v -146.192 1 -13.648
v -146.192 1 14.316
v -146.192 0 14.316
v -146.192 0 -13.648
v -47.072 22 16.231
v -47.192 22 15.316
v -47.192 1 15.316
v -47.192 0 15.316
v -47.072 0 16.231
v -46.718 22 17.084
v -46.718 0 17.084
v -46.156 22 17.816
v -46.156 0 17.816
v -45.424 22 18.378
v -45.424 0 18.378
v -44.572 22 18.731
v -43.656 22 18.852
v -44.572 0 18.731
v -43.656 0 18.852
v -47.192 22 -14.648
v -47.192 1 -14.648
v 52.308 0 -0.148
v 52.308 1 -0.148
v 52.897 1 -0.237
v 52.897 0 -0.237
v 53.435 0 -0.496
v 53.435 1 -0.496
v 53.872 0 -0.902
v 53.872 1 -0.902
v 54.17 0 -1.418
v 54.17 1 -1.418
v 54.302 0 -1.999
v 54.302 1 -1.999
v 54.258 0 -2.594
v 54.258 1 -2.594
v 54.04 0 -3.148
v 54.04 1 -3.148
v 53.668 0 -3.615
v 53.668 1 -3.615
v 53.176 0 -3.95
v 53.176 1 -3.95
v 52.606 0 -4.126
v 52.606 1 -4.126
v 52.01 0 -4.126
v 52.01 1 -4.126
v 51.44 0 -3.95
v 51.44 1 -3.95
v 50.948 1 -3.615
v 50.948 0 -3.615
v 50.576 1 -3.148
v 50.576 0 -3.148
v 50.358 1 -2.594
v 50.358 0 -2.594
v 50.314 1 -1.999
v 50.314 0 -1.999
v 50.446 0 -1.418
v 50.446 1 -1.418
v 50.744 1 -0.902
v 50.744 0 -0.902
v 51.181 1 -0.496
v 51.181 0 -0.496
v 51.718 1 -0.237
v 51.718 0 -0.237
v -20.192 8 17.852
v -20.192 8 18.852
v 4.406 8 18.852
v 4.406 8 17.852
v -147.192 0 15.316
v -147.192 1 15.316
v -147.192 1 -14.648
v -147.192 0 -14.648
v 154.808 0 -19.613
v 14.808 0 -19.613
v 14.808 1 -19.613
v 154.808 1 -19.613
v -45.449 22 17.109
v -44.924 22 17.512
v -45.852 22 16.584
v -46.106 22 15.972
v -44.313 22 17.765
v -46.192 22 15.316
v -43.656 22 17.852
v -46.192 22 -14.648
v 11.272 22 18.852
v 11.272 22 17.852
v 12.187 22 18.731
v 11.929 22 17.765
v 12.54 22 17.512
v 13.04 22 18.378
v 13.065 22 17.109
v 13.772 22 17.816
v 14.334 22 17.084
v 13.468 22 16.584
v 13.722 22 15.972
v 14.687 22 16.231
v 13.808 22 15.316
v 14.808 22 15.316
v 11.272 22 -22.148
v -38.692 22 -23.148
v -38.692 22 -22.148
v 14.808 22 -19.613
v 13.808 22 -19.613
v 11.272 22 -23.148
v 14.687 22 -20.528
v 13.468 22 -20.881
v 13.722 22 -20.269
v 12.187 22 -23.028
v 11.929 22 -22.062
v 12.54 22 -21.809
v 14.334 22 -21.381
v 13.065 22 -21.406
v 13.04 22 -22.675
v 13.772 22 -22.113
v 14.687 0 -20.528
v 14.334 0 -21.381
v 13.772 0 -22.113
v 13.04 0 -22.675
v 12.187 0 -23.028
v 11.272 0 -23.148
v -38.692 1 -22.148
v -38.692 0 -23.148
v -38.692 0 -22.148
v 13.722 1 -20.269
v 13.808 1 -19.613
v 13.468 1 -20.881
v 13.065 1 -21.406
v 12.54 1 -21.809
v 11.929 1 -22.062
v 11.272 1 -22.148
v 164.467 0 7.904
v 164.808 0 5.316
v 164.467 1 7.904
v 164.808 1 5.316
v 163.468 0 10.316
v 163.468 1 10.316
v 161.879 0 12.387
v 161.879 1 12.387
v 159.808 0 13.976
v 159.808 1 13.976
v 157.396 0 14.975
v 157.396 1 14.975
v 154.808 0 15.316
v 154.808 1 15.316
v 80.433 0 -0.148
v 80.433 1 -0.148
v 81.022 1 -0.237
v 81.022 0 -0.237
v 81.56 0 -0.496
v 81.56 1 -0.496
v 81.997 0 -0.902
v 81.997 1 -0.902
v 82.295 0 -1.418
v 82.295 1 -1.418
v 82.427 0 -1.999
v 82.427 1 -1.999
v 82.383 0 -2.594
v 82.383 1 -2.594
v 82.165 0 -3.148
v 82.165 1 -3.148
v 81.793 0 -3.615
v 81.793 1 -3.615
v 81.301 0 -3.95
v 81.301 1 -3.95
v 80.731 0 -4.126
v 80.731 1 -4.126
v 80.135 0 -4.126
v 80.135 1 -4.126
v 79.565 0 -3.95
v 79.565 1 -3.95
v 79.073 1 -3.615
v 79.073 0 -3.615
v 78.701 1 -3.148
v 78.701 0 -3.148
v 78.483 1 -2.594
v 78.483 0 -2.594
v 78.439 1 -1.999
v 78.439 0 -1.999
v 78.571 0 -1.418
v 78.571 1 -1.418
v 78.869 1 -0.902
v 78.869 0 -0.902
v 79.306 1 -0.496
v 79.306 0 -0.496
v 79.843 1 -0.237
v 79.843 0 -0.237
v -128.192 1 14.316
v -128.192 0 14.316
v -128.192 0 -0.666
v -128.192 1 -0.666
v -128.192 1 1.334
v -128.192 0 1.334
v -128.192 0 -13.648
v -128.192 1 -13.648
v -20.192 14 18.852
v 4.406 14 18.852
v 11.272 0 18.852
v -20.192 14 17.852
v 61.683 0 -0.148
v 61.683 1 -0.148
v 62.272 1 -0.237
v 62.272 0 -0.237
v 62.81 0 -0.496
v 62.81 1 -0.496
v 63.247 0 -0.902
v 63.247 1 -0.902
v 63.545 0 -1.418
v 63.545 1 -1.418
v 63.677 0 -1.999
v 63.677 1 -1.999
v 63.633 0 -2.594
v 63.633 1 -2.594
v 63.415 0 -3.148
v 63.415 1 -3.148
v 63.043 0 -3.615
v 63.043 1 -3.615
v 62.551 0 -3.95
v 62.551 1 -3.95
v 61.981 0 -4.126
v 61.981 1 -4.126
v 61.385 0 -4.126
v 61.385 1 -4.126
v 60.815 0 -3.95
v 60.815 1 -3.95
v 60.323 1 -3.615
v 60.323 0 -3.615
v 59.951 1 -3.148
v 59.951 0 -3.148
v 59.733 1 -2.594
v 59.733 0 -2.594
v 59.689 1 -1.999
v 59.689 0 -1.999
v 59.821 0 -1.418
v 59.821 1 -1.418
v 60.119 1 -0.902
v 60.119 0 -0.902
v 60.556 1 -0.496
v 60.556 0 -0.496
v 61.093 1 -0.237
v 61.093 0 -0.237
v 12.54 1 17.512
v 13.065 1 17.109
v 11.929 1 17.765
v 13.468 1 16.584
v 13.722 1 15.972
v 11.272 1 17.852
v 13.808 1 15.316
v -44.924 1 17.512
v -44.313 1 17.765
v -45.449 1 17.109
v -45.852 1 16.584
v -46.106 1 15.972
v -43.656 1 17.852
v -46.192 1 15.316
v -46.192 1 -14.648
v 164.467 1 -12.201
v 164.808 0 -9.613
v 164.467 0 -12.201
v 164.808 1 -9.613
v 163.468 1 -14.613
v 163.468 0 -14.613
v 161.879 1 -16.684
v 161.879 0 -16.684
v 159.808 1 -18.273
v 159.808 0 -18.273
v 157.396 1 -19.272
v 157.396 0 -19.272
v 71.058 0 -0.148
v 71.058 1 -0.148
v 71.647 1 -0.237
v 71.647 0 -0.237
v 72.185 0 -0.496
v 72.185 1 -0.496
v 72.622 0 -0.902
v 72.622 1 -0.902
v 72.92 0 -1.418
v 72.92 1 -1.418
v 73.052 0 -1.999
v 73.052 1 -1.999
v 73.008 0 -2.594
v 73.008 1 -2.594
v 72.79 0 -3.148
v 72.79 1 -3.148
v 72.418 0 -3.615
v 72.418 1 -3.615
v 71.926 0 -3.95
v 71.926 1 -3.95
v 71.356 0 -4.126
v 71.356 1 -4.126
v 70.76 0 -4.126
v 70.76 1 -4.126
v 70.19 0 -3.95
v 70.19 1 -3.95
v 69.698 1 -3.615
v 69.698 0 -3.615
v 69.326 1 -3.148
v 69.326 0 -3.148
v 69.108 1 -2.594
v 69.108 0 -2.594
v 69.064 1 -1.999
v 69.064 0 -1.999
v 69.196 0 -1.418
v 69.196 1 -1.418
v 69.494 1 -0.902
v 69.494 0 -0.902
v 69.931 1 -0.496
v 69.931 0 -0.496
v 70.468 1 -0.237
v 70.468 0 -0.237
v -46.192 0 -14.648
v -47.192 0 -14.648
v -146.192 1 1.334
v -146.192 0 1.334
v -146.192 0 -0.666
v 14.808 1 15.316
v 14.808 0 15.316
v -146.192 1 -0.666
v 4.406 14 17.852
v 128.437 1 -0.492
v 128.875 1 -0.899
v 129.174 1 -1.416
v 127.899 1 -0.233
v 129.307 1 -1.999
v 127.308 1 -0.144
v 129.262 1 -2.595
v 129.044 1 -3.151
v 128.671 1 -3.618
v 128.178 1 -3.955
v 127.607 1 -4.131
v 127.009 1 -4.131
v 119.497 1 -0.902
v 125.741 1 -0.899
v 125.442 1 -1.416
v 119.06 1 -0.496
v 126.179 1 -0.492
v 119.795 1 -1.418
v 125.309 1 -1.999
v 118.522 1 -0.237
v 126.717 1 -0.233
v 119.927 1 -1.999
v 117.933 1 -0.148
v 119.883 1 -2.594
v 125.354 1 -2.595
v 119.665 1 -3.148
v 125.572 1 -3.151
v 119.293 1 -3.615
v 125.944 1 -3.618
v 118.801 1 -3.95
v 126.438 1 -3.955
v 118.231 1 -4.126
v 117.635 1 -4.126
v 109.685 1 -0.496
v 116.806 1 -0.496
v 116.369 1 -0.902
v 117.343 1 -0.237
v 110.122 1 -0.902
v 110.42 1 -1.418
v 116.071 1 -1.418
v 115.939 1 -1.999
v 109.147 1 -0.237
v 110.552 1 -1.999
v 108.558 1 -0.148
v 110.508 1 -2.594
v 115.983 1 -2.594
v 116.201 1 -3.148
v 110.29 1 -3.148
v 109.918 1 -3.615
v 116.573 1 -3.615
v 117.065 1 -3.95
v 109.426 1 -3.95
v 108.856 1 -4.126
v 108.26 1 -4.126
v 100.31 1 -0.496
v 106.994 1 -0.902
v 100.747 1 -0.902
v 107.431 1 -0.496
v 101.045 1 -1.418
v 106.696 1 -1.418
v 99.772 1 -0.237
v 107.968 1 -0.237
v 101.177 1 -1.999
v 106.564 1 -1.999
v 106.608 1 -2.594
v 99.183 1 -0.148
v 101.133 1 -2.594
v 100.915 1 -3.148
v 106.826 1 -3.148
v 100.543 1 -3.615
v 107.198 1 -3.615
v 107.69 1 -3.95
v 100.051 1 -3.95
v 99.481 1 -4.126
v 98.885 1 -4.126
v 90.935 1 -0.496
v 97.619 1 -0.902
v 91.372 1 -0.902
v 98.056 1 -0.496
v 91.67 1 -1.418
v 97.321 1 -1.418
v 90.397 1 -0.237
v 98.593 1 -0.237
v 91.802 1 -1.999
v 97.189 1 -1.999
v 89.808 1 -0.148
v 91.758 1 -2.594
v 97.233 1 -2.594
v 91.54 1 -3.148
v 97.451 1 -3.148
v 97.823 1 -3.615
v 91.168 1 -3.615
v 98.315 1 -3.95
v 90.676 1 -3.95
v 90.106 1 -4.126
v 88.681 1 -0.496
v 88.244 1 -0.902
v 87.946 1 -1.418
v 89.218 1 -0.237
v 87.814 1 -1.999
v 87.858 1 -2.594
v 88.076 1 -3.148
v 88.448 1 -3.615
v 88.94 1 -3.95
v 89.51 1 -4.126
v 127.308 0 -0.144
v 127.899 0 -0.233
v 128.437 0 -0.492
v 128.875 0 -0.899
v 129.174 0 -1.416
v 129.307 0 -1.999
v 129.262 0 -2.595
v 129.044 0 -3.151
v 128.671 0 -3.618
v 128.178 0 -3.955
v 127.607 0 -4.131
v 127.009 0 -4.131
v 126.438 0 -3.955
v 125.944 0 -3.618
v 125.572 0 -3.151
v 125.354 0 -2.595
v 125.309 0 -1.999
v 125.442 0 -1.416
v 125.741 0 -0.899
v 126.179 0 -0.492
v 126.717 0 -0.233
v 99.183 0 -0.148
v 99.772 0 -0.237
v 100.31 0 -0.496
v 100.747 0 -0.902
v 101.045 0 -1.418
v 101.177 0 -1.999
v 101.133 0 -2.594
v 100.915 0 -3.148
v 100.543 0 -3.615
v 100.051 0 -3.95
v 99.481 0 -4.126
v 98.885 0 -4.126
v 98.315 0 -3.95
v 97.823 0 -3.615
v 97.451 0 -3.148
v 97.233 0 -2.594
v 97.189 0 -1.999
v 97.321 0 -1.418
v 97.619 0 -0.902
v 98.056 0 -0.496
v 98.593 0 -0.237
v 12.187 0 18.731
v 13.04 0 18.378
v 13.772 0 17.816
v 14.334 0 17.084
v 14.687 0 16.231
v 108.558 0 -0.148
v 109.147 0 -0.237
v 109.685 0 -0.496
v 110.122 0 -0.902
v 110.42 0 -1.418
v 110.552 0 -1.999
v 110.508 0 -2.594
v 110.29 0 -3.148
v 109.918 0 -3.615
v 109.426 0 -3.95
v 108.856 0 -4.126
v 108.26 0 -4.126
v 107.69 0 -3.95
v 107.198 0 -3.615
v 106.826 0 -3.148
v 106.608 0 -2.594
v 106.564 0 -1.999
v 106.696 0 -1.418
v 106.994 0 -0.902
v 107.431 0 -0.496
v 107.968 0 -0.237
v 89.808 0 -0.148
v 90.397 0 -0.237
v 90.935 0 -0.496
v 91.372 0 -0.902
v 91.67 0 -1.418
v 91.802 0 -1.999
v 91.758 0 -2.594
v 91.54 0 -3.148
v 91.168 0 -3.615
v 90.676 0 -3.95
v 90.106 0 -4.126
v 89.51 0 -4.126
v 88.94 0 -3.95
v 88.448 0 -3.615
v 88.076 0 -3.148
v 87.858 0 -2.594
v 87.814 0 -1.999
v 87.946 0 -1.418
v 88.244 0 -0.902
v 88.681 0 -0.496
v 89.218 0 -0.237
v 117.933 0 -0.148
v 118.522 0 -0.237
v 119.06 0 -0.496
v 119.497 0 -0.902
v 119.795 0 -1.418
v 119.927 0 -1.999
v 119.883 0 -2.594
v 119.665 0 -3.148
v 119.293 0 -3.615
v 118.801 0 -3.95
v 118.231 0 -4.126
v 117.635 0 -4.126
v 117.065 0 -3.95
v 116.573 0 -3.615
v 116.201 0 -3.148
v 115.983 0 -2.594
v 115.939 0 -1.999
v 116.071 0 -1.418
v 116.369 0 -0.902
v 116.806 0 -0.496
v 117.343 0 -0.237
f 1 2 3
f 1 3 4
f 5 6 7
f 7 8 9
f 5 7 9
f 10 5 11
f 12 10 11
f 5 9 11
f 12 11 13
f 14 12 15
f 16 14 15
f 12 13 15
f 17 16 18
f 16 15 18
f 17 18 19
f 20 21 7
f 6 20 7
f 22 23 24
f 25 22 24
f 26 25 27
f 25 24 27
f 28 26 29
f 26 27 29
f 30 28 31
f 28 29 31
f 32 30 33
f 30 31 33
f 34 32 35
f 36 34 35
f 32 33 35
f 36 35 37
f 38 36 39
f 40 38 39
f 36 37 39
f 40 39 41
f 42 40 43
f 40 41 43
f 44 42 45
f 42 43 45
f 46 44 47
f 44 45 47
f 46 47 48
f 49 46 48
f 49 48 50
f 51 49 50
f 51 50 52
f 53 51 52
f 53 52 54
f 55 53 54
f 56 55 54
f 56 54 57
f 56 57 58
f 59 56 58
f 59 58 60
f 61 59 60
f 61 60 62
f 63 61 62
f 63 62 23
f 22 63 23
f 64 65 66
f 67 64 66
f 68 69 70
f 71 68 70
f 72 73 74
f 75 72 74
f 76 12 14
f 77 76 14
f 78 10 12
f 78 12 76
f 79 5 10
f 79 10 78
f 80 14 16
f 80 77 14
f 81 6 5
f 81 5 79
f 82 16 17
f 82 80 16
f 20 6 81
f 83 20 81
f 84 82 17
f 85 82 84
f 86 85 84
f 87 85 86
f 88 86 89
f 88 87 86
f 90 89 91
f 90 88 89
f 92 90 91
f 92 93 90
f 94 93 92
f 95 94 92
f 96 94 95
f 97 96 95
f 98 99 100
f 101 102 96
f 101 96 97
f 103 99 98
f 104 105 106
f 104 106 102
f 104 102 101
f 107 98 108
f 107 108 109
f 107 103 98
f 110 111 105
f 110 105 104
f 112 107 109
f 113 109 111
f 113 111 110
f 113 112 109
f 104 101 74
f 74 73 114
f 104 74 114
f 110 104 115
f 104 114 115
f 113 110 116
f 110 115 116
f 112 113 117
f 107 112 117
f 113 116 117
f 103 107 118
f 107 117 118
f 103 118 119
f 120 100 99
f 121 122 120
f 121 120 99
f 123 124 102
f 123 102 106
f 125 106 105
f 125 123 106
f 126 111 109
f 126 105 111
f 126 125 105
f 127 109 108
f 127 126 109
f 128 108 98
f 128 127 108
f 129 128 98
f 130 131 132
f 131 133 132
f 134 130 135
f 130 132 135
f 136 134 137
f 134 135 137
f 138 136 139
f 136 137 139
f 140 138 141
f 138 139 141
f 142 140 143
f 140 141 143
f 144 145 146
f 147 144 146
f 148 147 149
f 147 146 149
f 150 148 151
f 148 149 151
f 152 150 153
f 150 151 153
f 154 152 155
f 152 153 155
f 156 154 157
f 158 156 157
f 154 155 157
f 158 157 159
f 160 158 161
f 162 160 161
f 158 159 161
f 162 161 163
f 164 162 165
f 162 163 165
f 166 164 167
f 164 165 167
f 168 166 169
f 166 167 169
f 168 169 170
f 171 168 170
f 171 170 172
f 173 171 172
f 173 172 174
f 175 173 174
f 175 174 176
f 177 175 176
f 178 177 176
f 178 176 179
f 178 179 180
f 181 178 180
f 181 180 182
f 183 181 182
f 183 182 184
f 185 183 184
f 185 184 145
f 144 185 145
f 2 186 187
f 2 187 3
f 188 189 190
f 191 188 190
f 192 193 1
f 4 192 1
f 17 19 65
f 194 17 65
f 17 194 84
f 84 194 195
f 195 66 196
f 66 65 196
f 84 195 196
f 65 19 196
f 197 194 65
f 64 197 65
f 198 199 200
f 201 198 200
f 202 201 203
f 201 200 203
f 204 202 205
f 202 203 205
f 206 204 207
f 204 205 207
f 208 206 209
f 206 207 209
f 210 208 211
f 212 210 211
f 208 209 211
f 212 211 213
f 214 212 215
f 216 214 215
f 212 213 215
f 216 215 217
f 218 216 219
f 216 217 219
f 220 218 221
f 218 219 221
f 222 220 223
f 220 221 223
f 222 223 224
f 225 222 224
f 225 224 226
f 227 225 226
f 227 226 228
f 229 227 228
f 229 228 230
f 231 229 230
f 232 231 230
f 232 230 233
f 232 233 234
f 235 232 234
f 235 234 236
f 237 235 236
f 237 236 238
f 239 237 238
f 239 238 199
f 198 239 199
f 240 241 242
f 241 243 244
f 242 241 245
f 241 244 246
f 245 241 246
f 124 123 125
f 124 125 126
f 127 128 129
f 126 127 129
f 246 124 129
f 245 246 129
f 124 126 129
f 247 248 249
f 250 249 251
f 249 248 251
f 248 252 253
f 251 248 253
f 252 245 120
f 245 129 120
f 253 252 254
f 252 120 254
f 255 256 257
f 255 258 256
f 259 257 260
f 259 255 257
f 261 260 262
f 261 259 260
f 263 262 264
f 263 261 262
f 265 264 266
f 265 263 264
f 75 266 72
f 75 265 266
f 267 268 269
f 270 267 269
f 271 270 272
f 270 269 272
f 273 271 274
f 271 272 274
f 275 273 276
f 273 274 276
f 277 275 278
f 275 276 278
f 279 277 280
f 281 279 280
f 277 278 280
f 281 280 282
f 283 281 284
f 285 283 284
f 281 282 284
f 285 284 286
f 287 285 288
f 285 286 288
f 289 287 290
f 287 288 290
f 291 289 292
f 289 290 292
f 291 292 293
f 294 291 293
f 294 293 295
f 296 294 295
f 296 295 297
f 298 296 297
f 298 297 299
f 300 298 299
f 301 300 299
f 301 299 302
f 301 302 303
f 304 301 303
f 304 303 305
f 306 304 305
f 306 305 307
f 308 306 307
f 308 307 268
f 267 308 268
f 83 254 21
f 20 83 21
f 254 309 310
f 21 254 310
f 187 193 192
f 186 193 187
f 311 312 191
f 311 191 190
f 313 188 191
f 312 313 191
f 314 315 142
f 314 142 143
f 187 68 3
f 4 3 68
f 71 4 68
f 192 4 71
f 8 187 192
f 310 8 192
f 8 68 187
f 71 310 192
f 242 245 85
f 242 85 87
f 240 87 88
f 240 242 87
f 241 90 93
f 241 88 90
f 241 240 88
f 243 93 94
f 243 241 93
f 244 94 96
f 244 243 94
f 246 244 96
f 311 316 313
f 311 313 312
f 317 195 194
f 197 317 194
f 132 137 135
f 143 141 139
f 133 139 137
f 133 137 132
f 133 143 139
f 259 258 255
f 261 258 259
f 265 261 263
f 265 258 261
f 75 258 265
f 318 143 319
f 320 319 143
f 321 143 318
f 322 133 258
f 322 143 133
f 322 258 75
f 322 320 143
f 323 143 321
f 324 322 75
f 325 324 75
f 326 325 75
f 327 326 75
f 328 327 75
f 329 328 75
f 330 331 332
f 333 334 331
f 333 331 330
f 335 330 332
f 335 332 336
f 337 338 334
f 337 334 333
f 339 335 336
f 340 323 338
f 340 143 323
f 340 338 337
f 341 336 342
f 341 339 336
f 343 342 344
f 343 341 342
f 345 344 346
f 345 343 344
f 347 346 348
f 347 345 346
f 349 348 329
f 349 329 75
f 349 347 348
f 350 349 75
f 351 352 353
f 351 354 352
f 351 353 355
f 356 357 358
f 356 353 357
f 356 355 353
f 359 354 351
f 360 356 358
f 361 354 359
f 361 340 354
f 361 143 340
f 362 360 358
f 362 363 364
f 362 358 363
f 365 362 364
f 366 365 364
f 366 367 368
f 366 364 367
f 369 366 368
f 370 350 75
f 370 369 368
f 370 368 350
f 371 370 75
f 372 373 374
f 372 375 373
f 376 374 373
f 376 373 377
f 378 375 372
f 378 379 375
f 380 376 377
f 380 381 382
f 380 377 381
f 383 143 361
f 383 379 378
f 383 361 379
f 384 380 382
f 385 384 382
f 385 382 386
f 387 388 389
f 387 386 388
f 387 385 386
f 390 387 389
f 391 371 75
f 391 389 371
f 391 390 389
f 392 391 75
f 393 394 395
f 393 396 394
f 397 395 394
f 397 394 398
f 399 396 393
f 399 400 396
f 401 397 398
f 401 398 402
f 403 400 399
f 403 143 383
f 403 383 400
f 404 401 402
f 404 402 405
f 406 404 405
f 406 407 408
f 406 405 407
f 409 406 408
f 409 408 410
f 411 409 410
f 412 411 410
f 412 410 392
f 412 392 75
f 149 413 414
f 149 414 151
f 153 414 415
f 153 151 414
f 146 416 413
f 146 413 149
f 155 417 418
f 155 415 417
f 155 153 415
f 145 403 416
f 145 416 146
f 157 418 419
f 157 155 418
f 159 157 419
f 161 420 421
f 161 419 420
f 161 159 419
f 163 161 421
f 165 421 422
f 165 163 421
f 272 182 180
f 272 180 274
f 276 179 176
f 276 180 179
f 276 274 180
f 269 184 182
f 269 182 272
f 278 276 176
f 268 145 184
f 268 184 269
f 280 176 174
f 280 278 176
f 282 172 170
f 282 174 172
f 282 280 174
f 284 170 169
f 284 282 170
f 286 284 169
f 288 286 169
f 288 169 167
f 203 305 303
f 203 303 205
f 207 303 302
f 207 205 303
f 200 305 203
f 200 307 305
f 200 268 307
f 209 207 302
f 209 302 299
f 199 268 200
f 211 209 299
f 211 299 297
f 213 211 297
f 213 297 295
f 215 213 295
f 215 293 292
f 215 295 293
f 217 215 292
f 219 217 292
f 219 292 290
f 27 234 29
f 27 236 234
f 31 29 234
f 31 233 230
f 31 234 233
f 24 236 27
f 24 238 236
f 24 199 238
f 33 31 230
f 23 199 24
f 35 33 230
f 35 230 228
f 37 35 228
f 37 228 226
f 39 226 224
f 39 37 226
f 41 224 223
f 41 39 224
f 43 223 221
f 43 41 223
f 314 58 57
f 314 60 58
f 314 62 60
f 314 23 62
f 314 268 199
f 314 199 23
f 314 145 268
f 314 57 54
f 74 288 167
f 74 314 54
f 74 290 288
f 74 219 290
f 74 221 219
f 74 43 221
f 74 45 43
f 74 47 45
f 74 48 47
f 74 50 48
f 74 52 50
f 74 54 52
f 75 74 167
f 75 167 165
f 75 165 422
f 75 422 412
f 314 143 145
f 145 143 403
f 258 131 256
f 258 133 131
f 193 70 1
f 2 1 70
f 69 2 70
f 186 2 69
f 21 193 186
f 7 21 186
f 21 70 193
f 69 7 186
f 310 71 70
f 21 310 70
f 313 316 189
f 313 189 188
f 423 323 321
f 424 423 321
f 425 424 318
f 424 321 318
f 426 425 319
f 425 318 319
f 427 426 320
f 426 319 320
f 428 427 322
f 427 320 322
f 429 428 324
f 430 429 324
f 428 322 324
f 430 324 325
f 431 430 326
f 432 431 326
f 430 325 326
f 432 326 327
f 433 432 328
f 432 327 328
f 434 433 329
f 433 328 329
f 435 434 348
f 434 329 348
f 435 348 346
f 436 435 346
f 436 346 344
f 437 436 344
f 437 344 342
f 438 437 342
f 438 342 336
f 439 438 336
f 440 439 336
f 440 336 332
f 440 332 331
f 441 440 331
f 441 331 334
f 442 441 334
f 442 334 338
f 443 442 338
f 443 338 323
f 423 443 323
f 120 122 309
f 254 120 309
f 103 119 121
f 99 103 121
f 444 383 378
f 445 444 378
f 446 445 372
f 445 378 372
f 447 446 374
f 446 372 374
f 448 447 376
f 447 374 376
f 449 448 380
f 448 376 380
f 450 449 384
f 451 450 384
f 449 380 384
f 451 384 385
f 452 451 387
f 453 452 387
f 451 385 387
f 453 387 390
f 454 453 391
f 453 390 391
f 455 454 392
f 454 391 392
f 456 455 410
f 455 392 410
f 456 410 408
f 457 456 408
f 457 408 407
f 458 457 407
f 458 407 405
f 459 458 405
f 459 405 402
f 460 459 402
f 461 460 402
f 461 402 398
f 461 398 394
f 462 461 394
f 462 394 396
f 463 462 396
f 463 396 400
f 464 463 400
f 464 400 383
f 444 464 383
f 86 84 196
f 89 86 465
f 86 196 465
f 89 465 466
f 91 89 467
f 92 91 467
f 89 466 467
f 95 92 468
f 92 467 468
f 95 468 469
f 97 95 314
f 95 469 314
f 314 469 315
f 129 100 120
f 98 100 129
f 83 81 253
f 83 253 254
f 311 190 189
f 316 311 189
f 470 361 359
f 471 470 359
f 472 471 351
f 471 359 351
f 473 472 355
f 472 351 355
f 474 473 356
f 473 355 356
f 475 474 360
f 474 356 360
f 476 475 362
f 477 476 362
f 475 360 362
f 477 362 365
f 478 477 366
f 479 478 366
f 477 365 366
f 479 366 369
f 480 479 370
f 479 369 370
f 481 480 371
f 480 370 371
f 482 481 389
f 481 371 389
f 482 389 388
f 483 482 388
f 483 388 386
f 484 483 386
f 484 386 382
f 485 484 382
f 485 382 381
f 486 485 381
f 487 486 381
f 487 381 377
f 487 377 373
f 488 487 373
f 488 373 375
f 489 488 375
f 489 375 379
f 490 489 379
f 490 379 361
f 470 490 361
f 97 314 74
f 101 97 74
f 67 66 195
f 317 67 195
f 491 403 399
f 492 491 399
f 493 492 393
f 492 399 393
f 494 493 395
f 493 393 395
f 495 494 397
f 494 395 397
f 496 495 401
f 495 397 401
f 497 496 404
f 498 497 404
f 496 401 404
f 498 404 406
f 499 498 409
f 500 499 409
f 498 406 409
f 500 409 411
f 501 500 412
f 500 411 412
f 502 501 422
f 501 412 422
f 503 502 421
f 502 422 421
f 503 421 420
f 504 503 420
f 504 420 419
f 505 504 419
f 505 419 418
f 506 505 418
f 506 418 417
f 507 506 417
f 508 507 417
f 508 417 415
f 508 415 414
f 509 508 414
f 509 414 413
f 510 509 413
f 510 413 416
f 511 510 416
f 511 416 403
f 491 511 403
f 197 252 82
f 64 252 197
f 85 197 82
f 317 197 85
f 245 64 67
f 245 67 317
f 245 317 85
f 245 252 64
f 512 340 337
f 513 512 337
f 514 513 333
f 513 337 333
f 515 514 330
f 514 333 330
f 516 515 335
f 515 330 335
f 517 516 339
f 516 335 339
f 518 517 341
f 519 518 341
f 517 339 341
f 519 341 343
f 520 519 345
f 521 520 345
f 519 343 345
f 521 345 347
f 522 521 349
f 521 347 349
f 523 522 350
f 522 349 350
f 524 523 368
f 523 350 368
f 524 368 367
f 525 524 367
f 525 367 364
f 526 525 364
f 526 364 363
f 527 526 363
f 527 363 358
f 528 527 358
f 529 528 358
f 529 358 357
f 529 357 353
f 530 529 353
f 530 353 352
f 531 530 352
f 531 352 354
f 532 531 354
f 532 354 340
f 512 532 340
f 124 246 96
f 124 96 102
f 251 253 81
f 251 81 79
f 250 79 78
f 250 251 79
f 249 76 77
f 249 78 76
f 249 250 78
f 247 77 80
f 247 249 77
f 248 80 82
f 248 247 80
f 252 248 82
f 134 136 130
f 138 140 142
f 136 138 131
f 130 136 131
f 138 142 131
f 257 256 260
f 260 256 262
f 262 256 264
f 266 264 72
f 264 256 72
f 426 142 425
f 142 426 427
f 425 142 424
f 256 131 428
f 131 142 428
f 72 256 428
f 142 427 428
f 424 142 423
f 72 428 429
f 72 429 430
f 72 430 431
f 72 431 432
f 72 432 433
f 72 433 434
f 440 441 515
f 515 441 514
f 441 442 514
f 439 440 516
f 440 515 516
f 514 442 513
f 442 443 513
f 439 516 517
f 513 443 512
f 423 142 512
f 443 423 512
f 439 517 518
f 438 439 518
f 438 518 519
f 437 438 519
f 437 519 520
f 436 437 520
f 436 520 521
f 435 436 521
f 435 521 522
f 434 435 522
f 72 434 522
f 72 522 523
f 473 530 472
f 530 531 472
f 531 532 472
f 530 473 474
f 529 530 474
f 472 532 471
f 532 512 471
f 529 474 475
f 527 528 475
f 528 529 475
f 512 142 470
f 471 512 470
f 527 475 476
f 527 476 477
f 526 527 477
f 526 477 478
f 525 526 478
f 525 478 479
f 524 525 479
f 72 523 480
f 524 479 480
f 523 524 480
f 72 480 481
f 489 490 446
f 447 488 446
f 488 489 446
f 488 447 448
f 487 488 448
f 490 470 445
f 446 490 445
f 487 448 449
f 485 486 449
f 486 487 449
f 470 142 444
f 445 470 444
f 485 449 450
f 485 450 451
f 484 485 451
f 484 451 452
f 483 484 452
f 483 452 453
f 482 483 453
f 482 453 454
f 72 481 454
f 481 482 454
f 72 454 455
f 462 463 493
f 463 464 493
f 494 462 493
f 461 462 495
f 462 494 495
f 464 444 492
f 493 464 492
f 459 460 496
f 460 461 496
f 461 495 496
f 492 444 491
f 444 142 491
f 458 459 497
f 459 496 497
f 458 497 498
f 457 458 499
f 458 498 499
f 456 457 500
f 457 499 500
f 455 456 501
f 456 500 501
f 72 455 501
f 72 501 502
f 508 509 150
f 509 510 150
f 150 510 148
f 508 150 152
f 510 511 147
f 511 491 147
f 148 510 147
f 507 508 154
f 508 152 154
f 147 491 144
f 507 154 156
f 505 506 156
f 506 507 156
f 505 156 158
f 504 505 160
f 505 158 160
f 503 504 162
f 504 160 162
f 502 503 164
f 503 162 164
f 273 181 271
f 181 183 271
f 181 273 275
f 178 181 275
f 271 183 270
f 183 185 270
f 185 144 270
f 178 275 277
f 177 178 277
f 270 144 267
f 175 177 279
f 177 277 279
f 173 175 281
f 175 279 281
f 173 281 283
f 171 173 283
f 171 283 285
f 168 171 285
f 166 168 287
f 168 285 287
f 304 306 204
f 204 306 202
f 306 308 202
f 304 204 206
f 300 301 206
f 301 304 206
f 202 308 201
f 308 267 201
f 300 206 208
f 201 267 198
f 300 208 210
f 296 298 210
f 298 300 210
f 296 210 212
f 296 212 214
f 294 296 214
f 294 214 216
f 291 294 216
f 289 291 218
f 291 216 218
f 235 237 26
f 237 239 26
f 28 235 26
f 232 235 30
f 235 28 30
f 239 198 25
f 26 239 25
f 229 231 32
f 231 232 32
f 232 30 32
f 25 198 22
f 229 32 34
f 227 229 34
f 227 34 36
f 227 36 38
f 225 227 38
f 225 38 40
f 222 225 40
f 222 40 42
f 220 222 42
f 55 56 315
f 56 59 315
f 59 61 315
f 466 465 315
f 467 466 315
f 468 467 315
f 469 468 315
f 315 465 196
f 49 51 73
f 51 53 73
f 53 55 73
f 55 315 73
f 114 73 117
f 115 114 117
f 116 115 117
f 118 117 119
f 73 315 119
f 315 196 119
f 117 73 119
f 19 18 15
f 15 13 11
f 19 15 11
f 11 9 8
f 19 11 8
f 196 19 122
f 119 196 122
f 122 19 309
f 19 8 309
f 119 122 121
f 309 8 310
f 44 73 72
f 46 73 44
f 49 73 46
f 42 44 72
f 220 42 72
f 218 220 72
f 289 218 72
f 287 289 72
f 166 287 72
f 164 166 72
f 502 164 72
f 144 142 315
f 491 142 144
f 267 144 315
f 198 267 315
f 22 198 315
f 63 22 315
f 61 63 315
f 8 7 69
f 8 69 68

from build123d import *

# Parameters (mm, degrees)
SKETCH1_W           = 22.5
SKETCH1_H           = 1
BOSS_EXTRUDE1_DEPTH = 22
SHELL1_T            = -1
CUT_EXTRUDE1_DEPTH  = 21
BOSS_EXTRUDE2_DEPTH = 100
SKETCH3_W           = 34.928932188
SKETCH3_H           = 1
BOSS_EXTRUDE3_DEPTH = 150
CUT_EXTRUDE2_DEPTH  = 10
SKETCH5_R           = 2.004611179
SKETCH5_R_2         = 2
CUT_EXTRUDE3_DEPTH  = 10
FILLET1_R           = 10
FILLET2_R           = 10
CUT_EXTRUDE4_DEPTH  = 10
BOSS_EXTRUDE5_DEPTH = 18


with BuildPart() as part:
    # Sketch1 → Boss-Extrude1 (new body)
    with BuildSketch(Plane(origin=(0, 0, 0), x_dir=(1, 0, 0), z_dir=(0, 1, 0))):
        with Locations((-27.442029657, 22.648486015)):
            Rectangle(SKETCH1_W, SKETCH1_H)
        with BuildLine():
            Line((-16.192029657, 23.148486015), (-16.192029657, 22.148486015))
            Line((-16.192029657, 22.148486015), (10.272436437, 22.148486015))
            ThreePointArc((10.272436437, 22.148486015), (12.772436437, 21.112952109), (13.807970343, 18.612952109))
            Line((13.807970343, 18.612952109), (13.807970343, -14.315980079))
            ThreePointArc((13.807970343, -14.315980079), (12.772436437, -16.815980079), (10.272436437, -17.851513985))
            Line((10.272436437, -17.851513985), (-16.192029657, -17.851513985))
            Line((-16.192029657, -17.851513985), (-16.192029657, -18.851513985))
            Line((-16.192029657, -18.851513985), (11.272436437, -18.851513985))
            ThreePointArc((11.272436437, -18.851513985), (13.772436437, -17.815980079), (14.807970343, -15.315980079))
            Line((14.807970343, -15.315980079), (14.807970343, -14.315980079))
            Line((14.807970343, -14.315980079), (14.807970343, 19.612952109))
            ThreePointArc((14.807970343, 19.612952109), (13.772436437, 22.112952109), (11.272436437, 23.148486015))
            Line((11.272436437, 23.148486015), (-16.192029657, 23.148486015))
        make_face()
        with BuildLine():
            Line((-46.192029657, -14.315980079), (-46.192029657, 14.648486015))
            Line((-46.192029657, 14.648486015), (-47.192029657, 14.648486015))
            Line((-47.192029657, 14.648486015), (-47.192029657, -15.315980079))
            ThreePointArc((-47.192029657, -15.315980079), (-46.156495751, -17.815980079), (-43.656495751, -18.851513985))
            Line((-43.656495751, -18.851513985), (-16.192029657, -18.851513985))
            Line((-16.192029657, -18.851513985), (-16.192029657, -17.851513985))
            Line((-16.192029657, -17.851513985), (-42.656495751, -17.851513985))
            ThreePointArc((-42.656495751, -17.851513985), (-45.156495751, -16.815980079), (-46.192029657, -14.315980079))
        make_face()
        with BuildLine():
            Line((-42.656495751, -17.851513985), (10.272436437, -17.851513985))
            ThreePointArc((10.272436437, -17.851513985), (12.772436437, -16.815980079), (13.807970343, -14.315980079))
            Line((13.807970343, -14.315980079), (13.807970343, 18.612952109))
            ThreePointArc((13.807970343, 18.612952109), (12.772436437, 21.112952109), (10.272436437, 22.148486015))
            Line((10.272436437, 22.148486015), (-38.692029657, 22.148486015))
            Line((-38.692029657, 22.148486015), (-46.192029657, 14.648486015))
            Line((-46.192029657, 14.648486015), (-46.192029657, -14.315980079))
            ThreePointArc((-46.192029657, -14.315980079), (-45.156495751, -16.815980079), (-42.656495751, -17.851513985))
        make_face()
    extrude(amount=BOSS_EXTRUDE1_DEPTH)

    # Shell1
    shell1_openings = [part.faces().sort_by_distance(p)[0] for p in [
        (-15.741951125, 22, -1.860810616),
    ]]
    offset(amount=SHELL1_T, openings=shell1_openings, kind=Kind.INTERSECTION)

    # Sketch2 → Cut-Extrude1 (cut)
    with BuildSketch(Plane(origin=(0, 22, 0), x_dir=(1, 0, 0), z_dir=(0, 1, 0))):
        Polygon((-38.692029657, 22.148486015), (-37.692029657, 22.148486015), (-37.692029657, 21.734272453), (-45.777816094, 13.648486015), (-46.192029657, 13.648486015), (-46.192029657, 14.648486015), align=None)
    extrude(amount=-CUT_EXTRUDE1_DEPTH, mode=Mode.SUBTRACT)

    # 3DSketch2 → Boss-Extrude2 (add)
    with BuildSketch(Plane(origin=(-47.192029657, 1.000281881, -14.648486015), x_dir=(0, -0.03336368478911428, 0.9994432772985632), z_dir=(-1, 0, 0))):
        Polygon((0, 0), (29.947784196, 0.999725002), (29.981157285, 0), (0.033373089, -0.999725002), align=None)
    extrude(amount=BOSS_EXTRUDE2_DEPTH)

    # Sketch3 → Boss-Extrude3 (add)
    with BuildSketch(Plane(origin=(14.807970343, 0, 0), x_dir=(0, 0, -1), z_dir=(1, 0, 0))):
        with Locations((2.148486015, 0.5)):
            Rectangle(SKETCH3_W, SKETCH3_H)
    extrude(amount=BOSS_EXTRUDE3_DEPTH)

    # Sketch4 → Cut-Extrude2 (cut)
    with BuildSketch(Plane.XY.offset(18.851513985)):
        Polygon((4.406319914, 11), (4.406319914, 14), (-16.192029657, 14), (-20.192029657, 14), (-20.192029657, 8), (-16.192029657, 8), (4.406319914, 8), align=None)
    extrude(amount=-CUT_EXTRUDE2_DEPTH, mode=Mode.SUBTRACT)

    # Sketch5 → Cut-Extrude3 (cut)
    with BuildSketch(Plane(origin=(0, 1.000281881, 0), x_dir=(1, 0, 0), z_dir=(0, 1, 0))):
        with Locations(Location((127.307970343, 2.148486015, 0), (0, 0, 270))):
            Circle(SKETCH5_R)
        with Locations(Location((108.557970343, 2.148486015, 0), (0, 0, 270))):
            Circle(SKETCH5_R_2)
        with Locations(Location((89.807970343, 2.148486015, 0), (0, 0, 270))):
            Circle(SKETCH5_R_2)
        with Locations(Location((71.057970343, 2.148486015, 0), (0, 0, 270))):
            Circle(SKETCH5_R_2)
        with Locations(Location((52.307970343, 2.148486015, 0), (0, 0, 270))):
            Circle(SKETCH5_R_2)
        with Locations(Location((61.682970343, 2.148486015, 0), (0, 0, 270))):
            Circle(SKETCH5_R_2)
        with Locations(Location((117.932970343, 2.148486015, 0), (0, 0, 270))):
            Circle(SKETCH5_R_2)
        with Locations(Location((99.182970343, 2.148486015, 0), (0, 0, 270))):
            Circle(SKETCH5_R_2)
        with Locations(Location((80.432970343, 2.148486015, 0), (0, 0, 270))):
            Circle(SKETCH5_R_2)
    extrude(amount=-CUT_EXTRUDE3_DEPTH, mode=Mode.SUBTRACT)

    # Fillet1
    fillet1_edges = [part.edges().sort_by_distance(p)[0] for p in [
        (164.807970343, 0.5, -19.612952109),
    ]]
    fillet(fillet1_edges, radius=FILLET1_R)

    # Fillet2
    fillet2_edges = [part.edges().sort_by_distance(p)[0] for p in [
        (164.807970343, 0.5, 15.315980079),
    ]]
    fillet(fillet2_edges, radius=FILLET2_R)

    # Sketch6 → Cut-Extrude4 (cut)
    with BuildSketch(Plane(origin=(0, 1.000281881, 0), x_dir=(1, 0, 0), z_dir=(0, 1, 0))):
        Polygon((-137.192029657, 13.648486015), (-128.192029657, 13.648486015), (-128.192029657, -14.315980079), (-146.192029657, -14.315980079), (-146.192029657, 13.648486015), align=None)
    extrude(amount=-CUT_EXTRUDE4_DEPTH, mode=Mode.SUBTRACT)


with BuildPart() as body_2:
    # Sketch7 → Boss-Extrude5 (new body)
    with BuildSketch(Plane.ZY.offset(128.192029657)):
        Polygon((1.333747032, 0.500140941), (1.333747032, 1.000281881), (-0.666252968, 1.000281881), (-0.666252968, 0), (1.333747032, 0), align=None)
    extrude(amount=BOSS_EXTRUDE5_DEPTH)


solid = Compound([part.part, body_2.part])
